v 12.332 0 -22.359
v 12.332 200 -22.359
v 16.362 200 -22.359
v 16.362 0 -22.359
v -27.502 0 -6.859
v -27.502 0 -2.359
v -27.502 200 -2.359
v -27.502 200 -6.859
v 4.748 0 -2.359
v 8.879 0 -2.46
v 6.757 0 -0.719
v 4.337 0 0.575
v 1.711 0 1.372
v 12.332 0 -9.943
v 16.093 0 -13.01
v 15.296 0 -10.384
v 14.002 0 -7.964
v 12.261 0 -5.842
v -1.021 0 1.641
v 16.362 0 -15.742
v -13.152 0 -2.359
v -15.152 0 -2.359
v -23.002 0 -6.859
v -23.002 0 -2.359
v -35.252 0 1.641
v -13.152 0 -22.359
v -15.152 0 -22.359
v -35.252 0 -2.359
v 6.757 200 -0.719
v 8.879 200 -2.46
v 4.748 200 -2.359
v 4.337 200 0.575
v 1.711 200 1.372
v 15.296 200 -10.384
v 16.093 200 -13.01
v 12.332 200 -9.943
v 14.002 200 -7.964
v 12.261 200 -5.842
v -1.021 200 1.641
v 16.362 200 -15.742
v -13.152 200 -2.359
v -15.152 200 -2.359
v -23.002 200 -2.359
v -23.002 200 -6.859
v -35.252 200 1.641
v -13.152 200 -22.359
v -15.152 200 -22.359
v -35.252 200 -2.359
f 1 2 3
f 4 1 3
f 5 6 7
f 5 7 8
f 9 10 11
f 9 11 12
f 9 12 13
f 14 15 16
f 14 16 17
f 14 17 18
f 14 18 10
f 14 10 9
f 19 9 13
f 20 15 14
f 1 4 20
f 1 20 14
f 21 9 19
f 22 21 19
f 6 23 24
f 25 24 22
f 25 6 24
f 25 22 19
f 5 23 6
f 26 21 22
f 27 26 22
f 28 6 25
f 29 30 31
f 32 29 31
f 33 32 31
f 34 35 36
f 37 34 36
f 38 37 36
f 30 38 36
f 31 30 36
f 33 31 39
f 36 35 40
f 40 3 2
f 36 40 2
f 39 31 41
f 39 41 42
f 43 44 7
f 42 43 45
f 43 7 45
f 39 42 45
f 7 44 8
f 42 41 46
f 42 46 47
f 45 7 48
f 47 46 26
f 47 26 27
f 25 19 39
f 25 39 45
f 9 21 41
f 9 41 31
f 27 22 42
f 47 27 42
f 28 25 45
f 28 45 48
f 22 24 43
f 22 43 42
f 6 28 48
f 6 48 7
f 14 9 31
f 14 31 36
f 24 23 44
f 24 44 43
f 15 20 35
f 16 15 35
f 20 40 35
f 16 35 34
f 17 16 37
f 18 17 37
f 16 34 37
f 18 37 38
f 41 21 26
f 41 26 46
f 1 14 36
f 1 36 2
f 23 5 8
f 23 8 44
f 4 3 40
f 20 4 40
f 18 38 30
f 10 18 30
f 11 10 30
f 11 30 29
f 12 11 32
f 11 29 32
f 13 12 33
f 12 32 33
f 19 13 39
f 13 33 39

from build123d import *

# Parameters (mm, degrees)
EXTRUDE_1_DEPTH = 200
FILLET_1_R      = 14
SKETCH_2_W      = 2
SKETCH_2_H      = 200
EXTRUDE_2_DEPTH = 20


with BuildPart() as part:
    # 草圖1 → 填料-伸長1 (new body)
    with BuildSketch(Plane(origin=(0, 0, 0), x_dir=(1, 0, 0), z_dir=(0, 1, 0))):
        Polygon((-27.501723192, 6.859259259), (-23.001723192, 6.859259259), (-23.001723192, 2.359259259), (4.748276808, 2.359259259), (12.331610141, 9.942592593), (12.331610141, 22.359259259), (16.361610141, 22.359259259), (16.361610141, 9.942592593), (4.778276808, -1.640740741), (-35.251723192, -1.640740741), (-35.251723192, 2.359259259), (-27.501723192, 2.359259259), align=None)
    extrude(amount=EXTRUDE_1_DEPTH)

    # 圓角1
    fillet_1_edges = [part.edges().sort_by_distance(p)[0] for p in [
        (16.361610141, 100, -9.942592593),
        (4.778276808, 100, 1.640740741),
    ]]
    fillet(fillet_1_edges, radius=FILLET_1_R)

    # 草圖2 → 填料-伸長2 (add)
    with BuildSketch(Plane(origin=(0, 0, -2.359259259), x_dir=(-1, 0, 0), z_dir=(0, 0, -1))):
        with Locations((14.151723192, 100)):
            Rectangle(SKETCH_2_W, SKETCH_2_H)
    extrude(amount=EXTRUDE_2_DEPTH)


solid = part.part
